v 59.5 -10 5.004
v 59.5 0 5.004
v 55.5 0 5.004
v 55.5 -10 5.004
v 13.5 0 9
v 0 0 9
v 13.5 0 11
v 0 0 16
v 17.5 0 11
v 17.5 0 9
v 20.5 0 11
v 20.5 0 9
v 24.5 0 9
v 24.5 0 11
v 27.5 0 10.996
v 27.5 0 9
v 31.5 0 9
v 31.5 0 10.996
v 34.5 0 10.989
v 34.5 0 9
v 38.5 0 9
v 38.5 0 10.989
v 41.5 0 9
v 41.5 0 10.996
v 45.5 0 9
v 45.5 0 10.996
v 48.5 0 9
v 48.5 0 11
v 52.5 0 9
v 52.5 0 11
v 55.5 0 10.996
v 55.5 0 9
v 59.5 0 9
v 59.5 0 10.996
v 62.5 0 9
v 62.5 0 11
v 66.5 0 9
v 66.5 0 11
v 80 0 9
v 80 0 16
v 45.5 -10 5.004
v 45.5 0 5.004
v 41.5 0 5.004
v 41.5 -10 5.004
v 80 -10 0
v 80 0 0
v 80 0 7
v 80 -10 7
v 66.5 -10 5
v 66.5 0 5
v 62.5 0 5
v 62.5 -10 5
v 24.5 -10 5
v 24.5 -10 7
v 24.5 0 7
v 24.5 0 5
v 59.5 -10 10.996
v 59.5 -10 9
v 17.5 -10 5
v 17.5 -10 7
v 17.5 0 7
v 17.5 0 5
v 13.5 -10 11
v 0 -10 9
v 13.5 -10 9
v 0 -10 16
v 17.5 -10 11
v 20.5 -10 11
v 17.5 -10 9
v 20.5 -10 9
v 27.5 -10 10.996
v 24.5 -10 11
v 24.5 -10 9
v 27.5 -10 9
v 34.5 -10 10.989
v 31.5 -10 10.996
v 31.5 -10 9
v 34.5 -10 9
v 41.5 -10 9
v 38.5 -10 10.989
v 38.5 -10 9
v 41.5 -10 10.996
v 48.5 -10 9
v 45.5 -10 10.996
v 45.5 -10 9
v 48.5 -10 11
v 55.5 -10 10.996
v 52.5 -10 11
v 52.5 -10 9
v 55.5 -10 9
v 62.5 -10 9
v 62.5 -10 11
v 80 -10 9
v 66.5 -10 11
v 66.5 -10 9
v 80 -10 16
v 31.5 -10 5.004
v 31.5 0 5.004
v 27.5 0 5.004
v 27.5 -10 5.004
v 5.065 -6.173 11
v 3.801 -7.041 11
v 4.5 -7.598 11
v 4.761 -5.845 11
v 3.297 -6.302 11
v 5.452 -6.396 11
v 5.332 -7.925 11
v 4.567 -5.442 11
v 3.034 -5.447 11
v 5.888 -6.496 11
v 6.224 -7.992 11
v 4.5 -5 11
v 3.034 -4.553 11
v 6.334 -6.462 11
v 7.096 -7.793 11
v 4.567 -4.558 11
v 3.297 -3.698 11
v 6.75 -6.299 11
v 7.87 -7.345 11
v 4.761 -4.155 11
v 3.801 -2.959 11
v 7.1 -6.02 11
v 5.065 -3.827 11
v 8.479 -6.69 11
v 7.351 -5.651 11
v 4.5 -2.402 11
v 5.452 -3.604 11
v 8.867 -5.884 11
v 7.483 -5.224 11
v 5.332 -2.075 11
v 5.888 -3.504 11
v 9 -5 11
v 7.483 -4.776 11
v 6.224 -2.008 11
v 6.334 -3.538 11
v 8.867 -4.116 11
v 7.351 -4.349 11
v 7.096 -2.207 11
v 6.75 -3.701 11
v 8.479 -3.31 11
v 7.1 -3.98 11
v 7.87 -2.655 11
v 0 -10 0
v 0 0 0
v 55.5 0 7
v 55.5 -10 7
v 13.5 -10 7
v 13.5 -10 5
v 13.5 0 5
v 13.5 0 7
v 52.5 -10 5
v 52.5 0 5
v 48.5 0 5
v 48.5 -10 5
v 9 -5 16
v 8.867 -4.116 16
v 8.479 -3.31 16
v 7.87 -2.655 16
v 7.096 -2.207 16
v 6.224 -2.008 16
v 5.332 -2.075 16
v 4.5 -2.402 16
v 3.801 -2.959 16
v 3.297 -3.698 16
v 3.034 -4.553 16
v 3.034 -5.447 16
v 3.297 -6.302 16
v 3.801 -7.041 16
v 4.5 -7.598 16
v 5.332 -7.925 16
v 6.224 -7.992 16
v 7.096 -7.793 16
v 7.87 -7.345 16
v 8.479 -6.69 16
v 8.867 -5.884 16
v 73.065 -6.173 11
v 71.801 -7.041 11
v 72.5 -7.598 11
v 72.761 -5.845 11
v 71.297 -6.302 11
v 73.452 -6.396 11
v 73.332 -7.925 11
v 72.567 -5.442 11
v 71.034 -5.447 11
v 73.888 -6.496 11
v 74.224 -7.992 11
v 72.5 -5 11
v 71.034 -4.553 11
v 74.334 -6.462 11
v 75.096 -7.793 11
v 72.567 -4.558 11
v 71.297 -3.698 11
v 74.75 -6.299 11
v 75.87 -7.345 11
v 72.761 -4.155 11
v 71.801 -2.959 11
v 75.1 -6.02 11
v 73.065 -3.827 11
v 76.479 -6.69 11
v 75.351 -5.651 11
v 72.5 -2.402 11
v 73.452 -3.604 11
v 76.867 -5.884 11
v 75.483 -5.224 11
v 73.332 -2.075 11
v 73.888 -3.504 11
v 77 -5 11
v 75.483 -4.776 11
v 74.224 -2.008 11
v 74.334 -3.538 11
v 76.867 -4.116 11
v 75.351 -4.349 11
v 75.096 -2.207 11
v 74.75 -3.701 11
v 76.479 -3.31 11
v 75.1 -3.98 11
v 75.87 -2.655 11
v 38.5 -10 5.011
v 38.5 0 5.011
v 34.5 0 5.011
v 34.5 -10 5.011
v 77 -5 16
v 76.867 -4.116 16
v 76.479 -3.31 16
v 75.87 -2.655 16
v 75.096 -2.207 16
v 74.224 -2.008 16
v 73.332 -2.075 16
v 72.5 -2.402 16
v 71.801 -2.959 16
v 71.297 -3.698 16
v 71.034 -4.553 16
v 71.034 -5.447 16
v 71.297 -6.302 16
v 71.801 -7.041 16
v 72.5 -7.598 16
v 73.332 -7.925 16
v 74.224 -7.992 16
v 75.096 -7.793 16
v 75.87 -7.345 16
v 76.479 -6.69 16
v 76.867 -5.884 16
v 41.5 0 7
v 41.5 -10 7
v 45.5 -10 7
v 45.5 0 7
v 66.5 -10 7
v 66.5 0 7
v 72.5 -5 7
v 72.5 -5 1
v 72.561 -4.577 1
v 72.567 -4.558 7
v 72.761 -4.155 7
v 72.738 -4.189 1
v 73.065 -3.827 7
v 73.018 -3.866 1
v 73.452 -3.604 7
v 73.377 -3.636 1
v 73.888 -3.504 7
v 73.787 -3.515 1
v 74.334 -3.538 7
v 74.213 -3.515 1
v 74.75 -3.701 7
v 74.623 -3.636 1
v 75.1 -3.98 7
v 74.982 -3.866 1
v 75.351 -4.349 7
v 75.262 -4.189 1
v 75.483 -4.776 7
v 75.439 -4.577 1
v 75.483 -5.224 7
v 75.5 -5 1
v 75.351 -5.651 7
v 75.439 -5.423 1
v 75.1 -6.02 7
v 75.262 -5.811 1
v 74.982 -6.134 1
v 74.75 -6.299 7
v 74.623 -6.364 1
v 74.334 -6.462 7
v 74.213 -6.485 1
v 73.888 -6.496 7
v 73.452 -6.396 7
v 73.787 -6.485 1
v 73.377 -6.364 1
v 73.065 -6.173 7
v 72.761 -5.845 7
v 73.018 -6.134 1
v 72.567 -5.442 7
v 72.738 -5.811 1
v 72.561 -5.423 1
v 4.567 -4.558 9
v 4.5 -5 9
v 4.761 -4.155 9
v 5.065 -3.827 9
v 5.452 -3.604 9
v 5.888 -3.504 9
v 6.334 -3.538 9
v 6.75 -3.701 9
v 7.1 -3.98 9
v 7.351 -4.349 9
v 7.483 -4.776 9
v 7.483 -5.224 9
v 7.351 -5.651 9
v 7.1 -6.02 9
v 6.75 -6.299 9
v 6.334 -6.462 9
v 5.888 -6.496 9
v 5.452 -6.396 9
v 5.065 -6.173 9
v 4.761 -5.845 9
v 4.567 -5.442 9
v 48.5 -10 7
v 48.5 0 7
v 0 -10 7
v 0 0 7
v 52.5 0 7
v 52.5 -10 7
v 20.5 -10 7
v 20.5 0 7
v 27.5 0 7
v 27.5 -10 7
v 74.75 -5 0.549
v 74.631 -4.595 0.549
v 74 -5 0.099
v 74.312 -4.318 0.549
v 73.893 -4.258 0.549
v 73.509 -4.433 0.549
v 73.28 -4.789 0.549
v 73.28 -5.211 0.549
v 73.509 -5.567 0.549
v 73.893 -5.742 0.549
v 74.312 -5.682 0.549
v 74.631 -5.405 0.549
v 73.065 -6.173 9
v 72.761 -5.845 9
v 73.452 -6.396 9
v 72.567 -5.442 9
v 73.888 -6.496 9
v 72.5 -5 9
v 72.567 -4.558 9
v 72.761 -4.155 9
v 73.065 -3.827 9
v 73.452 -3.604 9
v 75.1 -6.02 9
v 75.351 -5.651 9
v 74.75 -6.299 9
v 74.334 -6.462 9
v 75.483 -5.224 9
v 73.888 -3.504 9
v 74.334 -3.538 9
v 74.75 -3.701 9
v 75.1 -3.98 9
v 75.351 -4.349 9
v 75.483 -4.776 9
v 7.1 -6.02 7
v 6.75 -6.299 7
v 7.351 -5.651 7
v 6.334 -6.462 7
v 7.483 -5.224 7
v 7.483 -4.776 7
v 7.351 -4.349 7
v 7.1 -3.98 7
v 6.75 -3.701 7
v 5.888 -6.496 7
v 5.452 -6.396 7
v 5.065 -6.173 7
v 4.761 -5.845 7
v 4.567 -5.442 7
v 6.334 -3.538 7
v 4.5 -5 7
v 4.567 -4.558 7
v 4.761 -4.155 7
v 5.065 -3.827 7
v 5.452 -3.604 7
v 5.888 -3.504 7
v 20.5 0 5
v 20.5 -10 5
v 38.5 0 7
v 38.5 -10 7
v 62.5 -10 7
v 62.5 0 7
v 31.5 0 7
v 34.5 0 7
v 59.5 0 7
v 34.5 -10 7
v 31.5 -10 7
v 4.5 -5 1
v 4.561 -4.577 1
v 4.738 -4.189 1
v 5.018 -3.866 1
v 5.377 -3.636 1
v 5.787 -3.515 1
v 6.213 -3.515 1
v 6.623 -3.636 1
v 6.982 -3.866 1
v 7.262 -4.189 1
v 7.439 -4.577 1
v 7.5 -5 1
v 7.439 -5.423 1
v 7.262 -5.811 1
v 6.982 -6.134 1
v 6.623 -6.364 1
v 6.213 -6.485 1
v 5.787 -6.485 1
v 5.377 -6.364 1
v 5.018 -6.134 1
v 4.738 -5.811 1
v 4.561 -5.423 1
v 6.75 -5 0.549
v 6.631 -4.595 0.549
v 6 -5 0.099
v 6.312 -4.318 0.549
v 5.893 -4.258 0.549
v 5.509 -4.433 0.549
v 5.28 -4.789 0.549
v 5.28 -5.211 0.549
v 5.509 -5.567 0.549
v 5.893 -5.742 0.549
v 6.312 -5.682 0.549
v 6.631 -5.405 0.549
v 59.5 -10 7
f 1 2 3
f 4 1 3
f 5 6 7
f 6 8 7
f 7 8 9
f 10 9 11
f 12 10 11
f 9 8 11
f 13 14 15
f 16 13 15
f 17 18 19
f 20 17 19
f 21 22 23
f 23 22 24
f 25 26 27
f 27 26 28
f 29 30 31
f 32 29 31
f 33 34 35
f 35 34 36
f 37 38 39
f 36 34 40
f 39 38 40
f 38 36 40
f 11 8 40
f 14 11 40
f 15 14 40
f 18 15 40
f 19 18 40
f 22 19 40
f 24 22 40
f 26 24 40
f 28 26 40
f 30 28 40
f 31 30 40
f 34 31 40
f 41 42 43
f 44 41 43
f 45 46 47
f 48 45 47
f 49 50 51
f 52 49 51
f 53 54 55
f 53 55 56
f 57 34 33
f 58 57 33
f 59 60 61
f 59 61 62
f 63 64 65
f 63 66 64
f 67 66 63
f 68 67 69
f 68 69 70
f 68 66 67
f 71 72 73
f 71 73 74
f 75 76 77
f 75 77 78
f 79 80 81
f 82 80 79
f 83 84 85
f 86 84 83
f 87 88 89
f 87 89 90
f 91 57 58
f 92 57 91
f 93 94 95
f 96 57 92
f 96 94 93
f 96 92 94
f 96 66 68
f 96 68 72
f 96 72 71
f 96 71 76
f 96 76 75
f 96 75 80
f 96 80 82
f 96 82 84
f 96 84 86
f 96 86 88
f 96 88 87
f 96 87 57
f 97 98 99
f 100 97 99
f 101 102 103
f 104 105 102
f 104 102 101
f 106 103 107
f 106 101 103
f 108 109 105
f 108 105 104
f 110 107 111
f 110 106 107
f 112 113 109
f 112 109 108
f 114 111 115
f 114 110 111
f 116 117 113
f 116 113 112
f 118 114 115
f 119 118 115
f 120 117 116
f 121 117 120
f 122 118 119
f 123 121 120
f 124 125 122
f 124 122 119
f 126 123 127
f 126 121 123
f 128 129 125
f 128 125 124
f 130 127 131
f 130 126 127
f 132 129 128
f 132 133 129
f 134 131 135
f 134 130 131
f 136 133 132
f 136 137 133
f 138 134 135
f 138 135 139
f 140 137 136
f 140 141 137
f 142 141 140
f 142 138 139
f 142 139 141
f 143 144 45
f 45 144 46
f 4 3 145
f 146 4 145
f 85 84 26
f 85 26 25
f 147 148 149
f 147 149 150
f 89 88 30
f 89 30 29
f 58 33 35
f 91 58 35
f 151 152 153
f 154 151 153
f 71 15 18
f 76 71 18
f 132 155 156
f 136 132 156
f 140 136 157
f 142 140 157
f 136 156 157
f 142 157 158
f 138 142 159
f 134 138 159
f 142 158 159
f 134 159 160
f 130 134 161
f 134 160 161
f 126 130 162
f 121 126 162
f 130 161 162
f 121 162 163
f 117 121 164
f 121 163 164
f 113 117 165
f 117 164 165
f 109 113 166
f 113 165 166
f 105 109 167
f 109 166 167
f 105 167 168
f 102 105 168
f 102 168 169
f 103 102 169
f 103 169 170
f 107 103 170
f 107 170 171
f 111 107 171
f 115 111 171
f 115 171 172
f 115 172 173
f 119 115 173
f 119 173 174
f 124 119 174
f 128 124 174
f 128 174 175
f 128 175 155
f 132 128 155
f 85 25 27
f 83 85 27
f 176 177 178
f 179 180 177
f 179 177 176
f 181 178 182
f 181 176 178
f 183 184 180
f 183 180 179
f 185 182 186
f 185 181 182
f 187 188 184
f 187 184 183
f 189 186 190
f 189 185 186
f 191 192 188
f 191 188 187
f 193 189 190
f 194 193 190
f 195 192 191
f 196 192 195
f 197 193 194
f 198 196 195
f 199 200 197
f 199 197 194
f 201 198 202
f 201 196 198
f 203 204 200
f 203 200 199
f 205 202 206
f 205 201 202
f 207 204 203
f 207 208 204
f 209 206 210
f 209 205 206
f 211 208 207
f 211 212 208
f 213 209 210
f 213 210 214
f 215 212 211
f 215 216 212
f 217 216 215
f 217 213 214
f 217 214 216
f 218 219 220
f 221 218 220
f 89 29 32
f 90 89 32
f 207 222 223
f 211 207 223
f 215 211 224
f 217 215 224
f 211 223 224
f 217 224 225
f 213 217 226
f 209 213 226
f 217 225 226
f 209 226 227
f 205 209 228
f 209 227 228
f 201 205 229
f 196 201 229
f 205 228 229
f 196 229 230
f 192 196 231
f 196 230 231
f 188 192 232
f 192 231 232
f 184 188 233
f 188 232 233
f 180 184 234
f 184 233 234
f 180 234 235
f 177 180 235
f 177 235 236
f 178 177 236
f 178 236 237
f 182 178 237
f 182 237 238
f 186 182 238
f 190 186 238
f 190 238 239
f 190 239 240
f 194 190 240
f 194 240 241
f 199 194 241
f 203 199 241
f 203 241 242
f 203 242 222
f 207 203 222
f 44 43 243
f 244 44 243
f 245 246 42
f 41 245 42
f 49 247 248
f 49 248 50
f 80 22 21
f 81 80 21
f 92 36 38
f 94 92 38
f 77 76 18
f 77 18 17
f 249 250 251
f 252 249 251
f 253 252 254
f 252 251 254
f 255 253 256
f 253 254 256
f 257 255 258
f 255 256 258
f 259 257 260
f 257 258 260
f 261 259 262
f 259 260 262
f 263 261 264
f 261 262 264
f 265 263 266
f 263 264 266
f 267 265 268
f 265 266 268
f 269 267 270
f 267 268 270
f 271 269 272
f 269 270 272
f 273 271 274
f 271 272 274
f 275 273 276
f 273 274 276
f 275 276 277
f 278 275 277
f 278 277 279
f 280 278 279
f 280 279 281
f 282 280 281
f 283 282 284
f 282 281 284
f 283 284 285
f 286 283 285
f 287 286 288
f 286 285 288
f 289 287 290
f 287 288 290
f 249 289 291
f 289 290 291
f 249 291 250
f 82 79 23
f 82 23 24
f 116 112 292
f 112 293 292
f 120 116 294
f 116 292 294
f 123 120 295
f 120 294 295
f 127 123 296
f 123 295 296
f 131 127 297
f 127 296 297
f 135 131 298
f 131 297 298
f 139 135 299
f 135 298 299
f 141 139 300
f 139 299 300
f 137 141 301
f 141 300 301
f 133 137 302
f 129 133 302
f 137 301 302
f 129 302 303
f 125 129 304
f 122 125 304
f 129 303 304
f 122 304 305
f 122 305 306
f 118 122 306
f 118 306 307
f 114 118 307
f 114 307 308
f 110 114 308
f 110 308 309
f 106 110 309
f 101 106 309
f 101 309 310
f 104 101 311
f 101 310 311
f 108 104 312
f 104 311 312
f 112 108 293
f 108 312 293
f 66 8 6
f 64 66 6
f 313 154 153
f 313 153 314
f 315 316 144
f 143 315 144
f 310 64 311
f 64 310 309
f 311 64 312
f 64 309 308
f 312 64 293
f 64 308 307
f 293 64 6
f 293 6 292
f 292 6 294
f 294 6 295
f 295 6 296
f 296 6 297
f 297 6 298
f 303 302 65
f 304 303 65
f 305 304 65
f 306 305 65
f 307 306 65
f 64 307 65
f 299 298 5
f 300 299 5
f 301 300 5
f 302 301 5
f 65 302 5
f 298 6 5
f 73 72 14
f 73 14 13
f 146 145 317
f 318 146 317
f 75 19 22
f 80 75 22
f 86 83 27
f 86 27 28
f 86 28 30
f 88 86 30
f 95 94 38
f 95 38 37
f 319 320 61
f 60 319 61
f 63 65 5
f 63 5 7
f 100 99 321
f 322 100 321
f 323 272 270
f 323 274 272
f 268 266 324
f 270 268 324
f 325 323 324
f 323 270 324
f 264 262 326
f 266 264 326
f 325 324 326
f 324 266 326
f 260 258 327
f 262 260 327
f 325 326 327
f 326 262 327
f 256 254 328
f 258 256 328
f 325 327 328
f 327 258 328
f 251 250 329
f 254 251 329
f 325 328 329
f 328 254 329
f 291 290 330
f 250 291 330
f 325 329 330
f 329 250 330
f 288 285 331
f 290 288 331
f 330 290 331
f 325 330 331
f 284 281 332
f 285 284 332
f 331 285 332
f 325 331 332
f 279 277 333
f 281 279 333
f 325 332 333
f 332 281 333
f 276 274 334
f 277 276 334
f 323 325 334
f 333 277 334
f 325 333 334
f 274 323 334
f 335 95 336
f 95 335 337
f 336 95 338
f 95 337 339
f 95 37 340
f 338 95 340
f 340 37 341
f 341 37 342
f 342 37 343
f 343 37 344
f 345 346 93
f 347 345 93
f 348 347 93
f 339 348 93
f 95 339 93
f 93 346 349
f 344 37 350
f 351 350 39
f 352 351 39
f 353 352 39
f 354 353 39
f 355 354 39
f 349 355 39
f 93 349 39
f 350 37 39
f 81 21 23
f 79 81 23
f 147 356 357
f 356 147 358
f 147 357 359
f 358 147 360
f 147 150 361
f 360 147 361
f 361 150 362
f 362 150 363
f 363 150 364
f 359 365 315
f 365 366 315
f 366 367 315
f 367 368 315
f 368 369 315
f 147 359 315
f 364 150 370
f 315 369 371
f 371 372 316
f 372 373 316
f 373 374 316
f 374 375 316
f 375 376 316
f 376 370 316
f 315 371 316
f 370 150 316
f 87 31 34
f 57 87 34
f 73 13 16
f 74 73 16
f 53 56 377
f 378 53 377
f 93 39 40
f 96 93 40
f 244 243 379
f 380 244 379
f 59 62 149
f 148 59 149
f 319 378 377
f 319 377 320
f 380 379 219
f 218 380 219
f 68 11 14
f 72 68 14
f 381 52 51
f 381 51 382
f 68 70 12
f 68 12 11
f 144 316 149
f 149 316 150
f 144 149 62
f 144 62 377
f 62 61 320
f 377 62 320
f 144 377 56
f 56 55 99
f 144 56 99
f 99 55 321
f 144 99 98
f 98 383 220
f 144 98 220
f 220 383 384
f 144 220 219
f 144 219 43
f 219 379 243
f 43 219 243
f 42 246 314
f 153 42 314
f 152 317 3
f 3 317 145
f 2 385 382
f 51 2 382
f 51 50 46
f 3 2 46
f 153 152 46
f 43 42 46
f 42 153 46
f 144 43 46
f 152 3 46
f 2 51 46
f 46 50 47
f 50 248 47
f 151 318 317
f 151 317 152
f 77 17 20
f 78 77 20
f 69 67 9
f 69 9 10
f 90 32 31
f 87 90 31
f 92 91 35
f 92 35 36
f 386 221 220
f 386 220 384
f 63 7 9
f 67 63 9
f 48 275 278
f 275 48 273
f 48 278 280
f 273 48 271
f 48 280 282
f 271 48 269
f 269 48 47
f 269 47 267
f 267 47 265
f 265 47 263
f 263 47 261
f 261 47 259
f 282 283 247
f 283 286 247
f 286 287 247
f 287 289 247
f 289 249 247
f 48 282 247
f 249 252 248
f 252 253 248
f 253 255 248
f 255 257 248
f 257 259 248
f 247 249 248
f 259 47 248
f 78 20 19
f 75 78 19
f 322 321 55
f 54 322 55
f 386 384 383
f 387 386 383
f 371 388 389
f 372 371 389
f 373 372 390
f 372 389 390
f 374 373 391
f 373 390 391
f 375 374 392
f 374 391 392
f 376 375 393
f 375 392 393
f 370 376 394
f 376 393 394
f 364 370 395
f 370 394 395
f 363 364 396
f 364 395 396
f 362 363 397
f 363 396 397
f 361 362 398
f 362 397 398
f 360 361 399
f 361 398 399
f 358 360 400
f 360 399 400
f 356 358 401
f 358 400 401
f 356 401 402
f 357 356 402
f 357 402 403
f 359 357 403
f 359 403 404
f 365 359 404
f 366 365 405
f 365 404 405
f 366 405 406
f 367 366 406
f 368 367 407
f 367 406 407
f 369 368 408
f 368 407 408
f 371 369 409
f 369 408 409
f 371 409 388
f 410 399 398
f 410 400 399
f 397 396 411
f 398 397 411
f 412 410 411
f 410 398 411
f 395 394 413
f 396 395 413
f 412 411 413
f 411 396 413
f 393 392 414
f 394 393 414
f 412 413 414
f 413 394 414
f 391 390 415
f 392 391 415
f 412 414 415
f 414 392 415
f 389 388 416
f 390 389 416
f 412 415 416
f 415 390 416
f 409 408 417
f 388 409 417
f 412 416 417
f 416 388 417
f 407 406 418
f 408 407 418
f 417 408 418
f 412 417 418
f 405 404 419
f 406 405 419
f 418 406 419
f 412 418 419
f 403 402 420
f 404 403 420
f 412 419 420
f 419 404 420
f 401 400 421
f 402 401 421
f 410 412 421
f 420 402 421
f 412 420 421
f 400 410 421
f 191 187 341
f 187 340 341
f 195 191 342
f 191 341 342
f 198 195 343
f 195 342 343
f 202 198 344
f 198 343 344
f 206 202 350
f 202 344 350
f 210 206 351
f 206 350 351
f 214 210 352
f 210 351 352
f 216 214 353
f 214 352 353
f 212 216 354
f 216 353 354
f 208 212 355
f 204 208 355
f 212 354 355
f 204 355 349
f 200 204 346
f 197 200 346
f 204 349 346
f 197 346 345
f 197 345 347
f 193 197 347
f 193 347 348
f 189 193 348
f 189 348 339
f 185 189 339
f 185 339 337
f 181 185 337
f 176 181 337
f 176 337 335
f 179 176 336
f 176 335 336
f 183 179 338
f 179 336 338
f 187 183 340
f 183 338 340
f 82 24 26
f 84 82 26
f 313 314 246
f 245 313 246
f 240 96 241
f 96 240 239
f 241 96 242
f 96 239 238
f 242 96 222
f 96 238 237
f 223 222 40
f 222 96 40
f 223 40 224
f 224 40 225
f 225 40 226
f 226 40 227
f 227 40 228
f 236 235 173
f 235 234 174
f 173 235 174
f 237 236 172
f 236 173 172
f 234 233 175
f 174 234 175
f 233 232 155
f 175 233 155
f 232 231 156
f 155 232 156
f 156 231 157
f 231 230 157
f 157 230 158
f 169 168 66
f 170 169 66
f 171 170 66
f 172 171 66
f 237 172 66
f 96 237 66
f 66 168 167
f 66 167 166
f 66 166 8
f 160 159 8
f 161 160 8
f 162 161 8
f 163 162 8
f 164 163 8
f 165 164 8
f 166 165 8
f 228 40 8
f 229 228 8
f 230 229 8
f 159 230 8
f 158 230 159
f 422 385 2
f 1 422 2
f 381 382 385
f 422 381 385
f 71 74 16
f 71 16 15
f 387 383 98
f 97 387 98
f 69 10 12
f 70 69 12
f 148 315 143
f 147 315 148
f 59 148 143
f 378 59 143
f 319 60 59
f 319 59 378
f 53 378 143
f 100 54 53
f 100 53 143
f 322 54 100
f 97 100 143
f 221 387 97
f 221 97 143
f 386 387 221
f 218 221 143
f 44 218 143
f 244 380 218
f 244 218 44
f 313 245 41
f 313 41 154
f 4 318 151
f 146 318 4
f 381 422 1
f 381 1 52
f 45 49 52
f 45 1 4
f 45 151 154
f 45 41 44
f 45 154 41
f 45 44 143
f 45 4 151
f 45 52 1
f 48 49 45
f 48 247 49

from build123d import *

# Parameters (mm, degrees)
F1_DEPTH         = 10
F3_D             = 3
F3_DEPTH         = 15
F3_CBORE_D       = 6
F3_CBORE_DEPTH   = 5
F3_TIP           = 0.9012909285
F3_2_D           = 3
F3_2_DEPTH       = 15
F3_2_CBORE_D     = 6
F3_2_CBORE_DEPTH = 5
F3_2_TIP         = 0.9012909285


with BuildPart() as f1:
    # F0 (on Front) → F1 (new body)
    with BuildSketch(Plane.XZ):
        Polygon((0, 9), (13.5, 9), (13.5, 11), (17.5, 11), (17.5, 9), (20.5, 9), (20.5, 11), (24.5, 11), (24.5, 9), (27.5, 9), (27.5, 10.9958891446), (31.5, 10.9958891446), (31.5, 9), (34.5, 9), (34.5, 10.9885419408), (38.5, 10.9885419408), (38.5, 9), (41.5, 9), (41.5, 10.9958891446), (45.5, 10.9958891446), (45.5, 9), (48.5, 9), (48.5, 11), (52.5, 11), (52.5, 9), (55.5, 9), (55.5, 10.9961733073), (59.5, 10.9961733073), (59.5, 9), (62.5, 9), (62.5, 11), (66.5, 11), (66.5, 9), (80, 9), (80, 16), (0, 16), align=None)
    extrude(amount=F1_DEPTH)

    # F3
    with Locations(Plane.XY.offset(16)):
        with Locations((6, -5), (74, -5)):
            CounterBoreHole(F3_D / 2, F3_CBORE_D / 2, F3_CBORE_DEPTH, depth=F3_DEPTH)
            with Locations((0, 0, -(F3_DEPTH + F3_TIP / 2))):  # 118° drill point
                Cone(0, F3_D / 2, F3_TIP, mode=Mode.SUBTRACT)


with BuildPart() as f1b:
    # F0 (on Front) → F1, piece 2 (new body)
    with BuildSketch(Plane.XZ):
        Polygon((0, 7), (0, 0), (79.936705776, 0), (80, 0), (80, 7), (66.5, 7), (66.5, 5), (62.5, 5), (62.5, 7), (59.5, 7), (59.5, 5.0038266927), (55.5, 5.0038266927), (55.5, 7), (52.5, 7), (52.5, 5), (48.5, 5), (48.5, 7), (45.5, 7), (45.5, 5.0041108554), (41.5, 5.0041108554), (41.5, 7), (38.5, 7), (38.5, 5.0114580592), (34.5, 5.0114580592), (34.5, 7), (31.5, 7), (31.5, 5.0041108554), (27.5, 5.0041108554), (27.5, 7), (24.5, 7), (24.5, 5), (20.5, 5), (20.5, 7), (17.5, 7), (17.5, 5), (13.5, 5), (13.5, 7), align=None)
    extrude(amount=F1_DEPTH)

    # F3#2
    with Locations(Plane.XY.offset(16)):
        with Locations((6, -5), (74, -5)):
            CounterBoreHole(F3_2_D / 2, F3_2_CBORE_D / 2, F3_2_CBORE_DEPTH, depth=F3_2_DEPTH)
            with Locations((0, 0, -(F3_2_DEPTH + F3_2_TIP / 2))):  # 118° drill point
                Cone(0, F3_2_D / 2, F3_2_TIP, mode=Mode.SUBTRACT)


solid = Compound([f1.part, f1b.part])
